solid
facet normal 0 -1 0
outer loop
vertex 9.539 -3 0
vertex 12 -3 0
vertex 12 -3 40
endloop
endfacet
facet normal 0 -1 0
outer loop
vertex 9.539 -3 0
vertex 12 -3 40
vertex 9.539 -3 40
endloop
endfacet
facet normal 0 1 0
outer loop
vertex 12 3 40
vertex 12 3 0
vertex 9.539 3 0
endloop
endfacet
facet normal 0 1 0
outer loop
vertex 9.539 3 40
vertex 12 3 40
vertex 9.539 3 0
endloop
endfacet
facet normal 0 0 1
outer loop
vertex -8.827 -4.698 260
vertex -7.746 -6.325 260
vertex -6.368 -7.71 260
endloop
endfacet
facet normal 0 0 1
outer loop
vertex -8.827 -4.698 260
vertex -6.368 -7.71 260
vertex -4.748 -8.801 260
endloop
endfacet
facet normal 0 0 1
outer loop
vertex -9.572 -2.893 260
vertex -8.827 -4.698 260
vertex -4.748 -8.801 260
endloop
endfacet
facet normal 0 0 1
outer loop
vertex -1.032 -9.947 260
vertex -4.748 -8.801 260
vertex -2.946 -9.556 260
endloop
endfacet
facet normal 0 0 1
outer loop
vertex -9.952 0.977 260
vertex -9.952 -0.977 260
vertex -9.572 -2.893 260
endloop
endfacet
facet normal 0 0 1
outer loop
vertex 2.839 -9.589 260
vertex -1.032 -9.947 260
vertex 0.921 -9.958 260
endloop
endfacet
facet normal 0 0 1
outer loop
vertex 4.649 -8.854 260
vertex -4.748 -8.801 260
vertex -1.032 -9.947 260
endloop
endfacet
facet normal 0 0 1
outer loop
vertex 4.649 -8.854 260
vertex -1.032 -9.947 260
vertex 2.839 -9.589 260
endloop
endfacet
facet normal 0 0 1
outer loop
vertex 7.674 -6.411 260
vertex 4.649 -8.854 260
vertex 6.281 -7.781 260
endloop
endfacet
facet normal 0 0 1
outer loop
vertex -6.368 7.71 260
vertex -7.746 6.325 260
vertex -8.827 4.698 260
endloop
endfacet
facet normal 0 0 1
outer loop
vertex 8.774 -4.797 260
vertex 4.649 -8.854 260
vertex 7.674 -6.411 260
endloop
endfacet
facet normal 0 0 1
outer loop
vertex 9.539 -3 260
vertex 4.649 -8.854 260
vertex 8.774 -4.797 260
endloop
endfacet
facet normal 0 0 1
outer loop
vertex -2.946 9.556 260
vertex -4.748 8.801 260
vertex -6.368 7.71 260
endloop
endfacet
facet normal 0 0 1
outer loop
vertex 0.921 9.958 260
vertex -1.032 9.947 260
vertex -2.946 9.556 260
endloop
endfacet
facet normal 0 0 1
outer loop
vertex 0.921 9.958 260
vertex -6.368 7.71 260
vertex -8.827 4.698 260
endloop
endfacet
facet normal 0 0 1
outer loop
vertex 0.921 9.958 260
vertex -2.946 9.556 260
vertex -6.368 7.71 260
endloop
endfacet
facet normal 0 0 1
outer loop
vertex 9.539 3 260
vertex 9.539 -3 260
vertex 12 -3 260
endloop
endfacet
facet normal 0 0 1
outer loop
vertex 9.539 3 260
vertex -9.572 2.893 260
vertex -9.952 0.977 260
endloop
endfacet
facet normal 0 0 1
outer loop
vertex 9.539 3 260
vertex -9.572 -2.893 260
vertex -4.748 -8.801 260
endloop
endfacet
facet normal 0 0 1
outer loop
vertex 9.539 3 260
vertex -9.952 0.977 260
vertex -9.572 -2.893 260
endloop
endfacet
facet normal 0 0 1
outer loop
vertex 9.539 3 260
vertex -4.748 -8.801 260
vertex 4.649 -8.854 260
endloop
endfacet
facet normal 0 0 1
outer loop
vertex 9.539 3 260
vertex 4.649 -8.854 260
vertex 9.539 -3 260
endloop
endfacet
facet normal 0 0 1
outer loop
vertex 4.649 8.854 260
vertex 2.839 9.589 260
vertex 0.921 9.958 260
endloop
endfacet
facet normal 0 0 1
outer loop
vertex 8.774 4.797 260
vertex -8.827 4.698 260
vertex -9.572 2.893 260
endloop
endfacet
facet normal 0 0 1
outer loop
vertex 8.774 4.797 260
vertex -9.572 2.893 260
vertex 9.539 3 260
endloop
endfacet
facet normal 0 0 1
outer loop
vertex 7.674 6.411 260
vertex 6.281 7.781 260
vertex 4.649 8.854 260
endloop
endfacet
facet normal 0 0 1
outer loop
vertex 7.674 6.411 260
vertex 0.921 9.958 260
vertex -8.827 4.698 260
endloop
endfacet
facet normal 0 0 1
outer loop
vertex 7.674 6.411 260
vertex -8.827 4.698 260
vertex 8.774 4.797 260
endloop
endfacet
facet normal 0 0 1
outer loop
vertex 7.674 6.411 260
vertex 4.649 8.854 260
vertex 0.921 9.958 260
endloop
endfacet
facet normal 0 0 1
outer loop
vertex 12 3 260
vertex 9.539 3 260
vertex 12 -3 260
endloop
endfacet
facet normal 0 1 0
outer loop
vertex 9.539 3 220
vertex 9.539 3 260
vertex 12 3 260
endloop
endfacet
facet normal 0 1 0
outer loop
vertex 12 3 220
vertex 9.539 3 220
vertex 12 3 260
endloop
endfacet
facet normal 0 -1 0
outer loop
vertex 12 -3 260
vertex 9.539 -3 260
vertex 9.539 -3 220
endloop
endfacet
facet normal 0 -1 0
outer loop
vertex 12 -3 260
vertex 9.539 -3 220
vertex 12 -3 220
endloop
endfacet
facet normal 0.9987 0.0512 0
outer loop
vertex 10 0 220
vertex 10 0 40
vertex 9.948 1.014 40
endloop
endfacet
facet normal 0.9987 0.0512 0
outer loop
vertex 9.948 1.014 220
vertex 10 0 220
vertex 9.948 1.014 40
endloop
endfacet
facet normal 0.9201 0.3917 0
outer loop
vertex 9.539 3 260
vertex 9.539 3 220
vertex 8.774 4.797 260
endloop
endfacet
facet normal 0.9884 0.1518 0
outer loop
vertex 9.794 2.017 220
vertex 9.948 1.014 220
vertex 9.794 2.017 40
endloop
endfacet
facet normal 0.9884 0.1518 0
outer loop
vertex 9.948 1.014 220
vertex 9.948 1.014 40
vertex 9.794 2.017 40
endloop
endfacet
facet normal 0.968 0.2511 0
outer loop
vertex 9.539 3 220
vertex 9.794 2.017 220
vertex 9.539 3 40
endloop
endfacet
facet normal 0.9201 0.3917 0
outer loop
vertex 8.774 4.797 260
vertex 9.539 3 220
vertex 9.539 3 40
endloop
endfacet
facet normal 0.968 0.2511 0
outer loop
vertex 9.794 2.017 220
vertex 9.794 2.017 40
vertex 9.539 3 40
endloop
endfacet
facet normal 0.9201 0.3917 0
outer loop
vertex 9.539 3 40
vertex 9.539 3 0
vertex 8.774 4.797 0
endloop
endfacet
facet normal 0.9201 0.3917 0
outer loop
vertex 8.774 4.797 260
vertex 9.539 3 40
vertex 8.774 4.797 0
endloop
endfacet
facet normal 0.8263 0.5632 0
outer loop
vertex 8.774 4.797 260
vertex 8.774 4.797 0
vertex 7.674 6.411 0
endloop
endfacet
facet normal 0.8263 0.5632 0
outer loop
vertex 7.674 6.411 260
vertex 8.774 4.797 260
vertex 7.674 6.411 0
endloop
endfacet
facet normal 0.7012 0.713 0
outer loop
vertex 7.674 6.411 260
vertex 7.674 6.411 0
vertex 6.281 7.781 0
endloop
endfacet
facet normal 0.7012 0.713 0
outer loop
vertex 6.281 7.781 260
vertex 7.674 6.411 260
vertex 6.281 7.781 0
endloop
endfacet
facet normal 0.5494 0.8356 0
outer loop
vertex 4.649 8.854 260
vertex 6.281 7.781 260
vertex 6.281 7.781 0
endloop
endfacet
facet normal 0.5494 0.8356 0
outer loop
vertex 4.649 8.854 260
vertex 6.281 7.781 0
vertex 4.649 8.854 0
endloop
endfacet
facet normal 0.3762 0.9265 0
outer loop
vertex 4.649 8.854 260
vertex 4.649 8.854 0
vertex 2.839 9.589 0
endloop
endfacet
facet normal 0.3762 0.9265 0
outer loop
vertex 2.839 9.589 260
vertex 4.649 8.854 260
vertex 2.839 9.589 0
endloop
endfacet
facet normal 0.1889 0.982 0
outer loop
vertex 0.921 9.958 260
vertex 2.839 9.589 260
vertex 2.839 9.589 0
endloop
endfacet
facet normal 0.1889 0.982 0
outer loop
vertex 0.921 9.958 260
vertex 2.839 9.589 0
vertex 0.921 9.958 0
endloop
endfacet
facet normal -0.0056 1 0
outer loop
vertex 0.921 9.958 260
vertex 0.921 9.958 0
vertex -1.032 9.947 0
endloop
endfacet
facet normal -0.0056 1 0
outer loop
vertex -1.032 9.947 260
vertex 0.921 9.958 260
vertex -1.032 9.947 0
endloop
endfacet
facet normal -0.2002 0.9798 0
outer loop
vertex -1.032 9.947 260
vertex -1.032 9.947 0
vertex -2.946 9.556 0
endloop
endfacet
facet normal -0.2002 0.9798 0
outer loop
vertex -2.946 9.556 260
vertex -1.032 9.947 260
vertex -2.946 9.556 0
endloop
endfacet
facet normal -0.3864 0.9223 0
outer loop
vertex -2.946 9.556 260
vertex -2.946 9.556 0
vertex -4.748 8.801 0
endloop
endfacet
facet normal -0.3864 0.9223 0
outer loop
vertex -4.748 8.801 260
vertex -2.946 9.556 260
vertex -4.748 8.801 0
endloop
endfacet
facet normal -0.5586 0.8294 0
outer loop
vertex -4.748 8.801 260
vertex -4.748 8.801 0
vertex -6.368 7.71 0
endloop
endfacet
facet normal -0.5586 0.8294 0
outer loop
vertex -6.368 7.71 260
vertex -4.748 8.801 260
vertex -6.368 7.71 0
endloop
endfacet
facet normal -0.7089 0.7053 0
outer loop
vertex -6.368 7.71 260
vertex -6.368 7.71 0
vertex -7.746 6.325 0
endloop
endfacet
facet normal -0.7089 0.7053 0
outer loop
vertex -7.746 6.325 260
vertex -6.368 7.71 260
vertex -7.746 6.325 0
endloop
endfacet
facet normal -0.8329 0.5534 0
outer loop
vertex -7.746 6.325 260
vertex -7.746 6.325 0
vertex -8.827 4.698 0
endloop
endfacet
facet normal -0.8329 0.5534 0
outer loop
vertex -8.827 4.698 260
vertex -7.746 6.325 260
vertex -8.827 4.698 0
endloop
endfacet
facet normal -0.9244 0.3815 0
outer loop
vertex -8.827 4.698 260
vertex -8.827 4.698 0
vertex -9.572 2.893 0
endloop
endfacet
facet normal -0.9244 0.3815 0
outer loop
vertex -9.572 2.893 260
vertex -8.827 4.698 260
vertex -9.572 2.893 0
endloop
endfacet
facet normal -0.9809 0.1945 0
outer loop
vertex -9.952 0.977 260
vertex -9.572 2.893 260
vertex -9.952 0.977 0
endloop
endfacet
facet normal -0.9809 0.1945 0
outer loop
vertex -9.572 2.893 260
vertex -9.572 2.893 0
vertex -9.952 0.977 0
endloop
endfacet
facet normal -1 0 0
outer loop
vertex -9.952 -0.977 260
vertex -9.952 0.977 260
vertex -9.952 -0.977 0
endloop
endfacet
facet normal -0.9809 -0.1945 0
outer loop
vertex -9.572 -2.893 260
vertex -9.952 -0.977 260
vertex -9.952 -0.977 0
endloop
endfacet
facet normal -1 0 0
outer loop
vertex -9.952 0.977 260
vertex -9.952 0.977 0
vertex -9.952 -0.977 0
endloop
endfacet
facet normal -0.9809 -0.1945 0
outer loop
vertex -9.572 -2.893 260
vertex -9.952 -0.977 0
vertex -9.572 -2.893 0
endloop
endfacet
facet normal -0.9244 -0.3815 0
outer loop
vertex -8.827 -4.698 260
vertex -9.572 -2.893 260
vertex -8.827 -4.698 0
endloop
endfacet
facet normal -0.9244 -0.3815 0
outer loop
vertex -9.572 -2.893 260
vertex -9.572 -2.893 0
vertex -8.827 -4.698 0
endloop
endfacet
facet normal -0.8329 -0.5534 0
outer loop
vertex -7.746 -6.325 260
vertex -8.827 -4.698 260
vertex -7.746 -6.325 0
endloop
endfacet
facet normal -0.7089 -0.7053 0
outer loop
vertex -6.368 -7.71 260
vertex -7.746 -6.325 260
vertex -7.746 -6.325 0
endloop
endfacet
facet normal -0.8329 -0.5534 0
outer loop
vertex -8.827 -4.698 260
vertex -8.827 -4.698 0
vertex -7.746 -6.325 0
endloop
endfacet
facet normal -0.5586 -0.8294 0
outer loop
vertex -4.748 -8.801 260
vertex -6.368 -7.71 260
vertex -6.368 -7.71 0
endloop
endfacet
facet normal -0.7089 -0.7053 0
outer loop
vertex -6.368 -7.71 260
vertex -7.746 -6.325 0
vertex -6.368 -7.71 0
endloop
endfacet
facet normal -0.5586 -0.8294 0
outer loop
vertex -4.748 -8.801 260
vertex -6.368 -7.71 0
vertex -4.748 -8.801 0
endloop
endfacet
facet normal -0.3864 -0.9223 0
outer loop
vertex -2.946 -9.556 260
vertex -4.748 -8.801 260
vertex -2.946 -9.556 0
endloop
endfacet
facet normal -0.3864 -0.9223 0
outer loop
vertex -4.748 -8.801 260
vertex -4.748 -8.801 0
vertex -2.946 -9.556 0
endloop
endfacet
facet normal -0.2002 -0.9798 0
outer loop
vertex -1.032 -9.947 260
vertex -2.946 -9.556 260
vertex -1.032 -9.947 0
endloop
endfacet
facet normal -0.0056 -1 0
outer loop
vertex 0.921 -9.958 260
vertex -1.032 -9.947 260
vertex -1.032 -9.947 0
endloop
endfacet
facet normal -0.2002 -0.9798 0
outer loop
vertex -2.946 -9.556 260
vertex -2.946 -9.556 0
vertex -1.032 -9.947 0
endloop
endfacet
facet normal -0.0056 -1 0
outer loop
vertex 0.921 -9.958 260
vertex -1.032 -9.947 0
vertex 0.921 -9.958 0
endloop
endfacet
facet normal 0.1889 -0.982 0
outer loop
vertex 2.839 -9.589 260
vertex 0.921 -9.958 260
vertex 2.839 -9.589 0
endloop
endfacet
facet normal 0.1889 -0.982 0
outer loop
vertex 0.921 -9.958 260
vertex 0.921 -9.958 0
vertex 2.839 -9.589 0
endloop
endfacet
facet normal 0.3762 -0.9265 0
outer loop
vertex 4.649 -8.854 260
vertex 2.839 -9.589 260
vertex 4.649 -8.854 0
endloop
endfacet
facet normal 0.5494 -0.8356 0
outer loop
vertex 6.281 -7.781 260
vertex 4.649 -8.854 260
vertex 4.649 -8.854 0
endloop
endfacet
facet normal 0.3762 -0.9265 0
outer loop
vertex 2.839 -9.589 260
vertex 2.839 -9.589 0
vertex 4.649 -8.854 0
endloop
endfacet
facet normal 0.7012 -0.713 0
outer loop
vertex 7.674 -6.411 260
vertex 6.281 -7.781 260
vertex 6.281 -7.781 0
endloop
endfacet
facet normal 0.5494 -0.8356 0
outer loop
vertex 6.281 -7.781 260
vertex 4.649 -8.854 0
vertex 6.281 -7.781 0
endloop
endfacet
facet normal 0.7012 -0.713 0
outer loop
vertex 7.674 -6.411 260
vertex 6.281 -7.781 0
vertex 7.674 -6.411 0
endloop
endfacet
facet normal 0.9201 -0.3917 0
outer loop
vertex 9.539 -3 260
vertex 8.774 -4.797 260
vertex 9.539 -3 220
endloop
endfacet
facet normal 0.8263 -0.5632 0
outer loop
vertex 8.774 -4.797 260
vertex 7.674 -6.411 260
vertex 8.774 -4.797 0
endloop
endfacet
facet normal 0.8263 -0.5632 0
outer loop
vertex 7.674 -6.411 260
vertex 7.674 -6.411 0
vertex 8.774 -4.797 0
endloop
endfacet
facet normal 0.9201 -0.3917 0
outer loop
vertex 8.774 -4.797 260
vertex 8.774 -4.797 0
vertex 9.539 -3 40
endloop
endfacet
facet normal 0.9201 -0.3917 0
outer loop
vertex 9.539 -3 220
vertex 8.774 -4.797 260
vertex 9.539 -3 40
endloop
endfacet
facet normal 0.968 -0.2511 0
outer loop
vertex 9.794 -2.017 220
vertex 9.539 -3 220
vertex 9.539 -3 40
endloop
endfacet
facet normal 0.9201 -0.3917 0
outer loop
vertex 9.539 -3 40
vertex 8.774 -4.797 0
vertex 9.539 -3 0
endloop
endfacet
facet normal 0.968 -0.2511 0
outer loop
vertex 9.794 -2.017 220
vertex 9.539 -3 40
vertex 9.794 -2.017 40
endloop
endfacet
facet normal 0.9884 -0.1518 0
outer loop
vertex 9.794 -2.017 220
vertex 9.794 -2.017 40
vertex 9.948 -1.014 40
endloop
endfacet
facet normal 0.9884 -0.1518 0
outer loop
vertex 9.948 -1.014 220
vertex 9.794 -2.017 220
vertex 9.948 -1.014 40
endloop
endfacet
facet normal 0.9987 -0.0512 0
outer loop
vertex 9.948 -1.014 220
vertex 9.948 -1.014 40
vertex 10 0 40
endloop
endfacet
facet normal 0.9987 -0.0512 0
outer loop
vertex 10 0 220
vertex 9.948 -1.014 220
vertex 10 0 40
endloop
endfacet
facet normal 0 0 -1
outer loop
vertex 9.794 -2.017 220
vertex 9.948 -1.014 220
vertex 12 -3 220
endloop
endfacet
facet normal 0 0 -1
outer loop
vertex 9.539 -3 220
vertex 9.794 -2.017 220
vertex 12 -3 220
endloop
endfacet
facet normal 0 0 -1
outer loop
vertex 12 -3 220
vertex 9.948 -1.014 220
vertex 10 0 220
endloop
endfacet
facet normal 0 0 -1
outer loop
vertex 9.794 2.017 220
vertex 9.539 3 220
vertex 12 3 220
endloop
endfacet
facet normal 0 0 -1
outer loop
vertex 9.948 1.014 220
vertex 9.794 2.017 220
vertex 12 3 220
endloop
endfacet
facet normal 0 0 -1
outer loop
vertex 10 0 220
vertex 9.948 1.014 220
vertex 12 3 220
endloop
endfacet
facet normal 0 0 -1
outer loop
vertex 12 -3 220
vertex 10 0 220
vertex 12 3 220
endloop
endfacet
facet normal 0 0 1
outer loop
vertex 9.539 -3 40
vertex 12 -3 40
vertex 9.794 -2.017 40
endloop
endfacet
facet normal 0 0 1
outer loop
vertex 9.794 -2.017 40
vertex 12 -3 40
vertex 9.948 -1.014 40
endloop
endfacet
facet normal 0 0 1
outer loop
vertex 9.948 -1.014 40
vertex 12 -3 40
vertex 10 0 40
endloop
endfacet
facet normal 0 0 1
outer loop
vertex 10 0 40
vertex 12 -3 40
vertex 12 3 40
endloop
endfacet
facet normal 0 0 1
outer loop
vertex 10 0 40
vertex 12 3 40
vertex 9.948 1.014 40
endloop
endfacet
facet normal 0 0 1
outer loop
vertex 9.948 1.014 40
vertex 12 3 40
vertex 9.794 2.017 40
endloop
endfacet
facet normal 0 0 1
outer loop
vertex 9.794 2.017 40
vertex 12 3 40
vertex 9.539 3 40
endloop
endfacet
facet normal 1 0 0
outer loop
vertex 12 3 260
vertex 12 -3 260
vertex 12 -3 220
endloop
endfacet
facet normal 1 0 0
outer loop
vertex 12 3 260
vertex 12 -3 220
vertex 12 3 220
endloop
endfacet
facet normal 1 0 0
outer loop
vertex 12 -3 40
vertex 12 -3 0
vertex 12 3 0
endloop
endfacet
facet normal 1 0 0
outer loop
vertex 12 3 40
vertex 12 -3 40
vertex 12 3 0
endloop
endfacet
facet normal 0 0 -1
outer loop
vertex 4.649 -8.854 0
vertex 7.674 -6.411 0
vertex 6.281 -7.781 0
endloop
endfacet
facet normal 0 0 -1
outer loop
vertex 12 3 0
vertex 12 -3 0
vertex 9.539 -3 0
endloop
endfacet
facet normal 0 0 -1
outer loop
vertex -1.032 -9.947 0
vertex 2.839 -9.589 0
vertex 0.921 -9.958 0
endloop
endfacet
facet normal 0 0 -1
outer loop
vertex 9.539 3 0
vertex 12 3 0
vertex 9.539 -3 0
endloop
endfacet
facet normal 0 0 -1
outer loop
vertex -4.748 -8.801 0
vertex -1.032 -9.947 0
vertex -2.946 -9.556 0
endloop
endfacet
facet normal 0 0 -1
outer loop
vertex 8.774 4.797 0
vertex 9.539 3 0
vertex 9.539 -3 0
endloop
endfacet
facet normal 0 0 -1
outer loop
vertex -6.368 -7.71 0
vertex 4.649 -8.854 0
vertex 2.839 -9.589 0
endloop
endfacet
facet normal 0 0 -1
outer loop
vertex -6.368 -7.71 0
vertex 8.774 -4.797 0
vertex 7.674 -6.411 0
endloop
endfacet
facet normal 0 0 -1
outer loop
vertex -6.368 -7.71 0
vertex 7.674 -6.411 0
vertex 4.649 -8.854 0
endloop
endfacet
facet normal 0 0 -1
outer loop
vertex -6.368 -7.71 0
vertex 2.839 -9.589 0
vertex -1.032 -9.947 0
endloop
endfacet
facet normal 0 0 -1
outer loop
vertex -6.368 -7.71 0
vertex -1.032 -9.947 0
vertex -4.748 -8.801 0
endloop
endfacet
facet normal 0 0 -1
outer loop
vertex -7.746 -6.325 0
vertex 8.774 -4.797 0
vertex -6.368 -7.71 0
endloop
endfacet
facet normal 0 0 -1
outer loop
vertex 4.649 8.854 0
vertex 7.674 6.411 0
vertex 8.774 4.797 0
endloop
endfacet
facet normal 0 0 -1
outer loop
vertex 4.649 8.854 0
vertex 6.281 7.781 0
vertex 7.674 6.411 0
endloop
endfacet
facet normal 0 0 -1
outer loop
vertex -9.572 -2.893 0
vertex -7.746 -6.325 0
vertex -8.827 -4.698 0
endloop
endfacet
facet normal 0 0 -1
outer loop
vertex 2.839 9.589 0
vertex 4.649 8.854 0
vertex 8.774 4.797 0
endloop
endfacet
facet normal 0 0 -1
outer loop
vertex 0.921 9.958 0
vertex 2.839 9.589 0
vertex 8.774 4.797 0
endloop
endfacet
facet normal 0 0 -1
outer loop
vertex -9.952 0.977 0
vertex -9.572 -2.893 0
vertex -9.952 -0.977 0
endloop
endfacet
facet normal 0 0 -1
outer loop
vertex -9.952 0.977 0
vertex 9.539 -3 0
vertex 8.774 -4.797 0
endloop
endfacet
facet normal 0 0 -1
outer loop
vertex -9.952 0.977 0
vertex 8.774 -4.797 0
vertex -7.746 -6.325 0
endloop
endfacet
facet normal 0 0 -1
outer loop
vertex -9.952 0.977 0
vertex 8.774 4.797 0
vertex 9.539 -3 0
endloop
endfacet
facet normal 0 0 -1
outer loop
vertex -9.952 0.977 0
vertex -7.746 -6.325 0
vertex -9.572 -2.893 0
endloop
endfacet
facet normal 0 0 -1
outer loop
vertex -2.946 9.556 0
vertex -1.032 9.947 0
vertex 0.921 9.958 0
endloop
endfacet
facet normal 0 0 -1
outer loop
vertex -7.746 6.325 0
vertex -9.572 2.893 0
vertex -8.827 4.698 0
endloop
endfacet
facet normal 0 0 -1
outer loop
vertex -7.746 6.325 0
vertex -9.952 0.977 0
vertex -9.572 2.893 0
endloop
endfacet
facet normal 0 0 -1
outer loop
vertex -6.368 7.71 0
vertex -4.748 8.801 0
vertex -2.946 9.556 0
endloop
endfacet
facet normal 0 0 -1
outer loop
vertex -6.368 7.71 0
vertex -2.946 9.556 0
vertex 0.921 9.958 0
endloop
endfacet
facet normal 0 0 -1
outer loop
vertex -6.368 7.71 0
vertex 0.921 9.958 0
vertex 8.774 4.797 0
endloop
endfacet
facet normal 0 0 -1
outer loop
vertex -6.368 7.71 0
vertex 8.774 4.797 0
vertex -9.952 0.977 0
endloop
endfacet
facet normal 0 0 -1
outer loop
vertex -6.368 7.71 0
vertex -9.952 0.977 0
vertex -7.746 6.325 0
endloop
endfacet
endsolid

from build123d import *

# Parameters (mm, degrees)
SKETCH2_R           = 10
BOSS_EXTRUDE5_DEPTH = 260
SKETCH5_W           = 12
SKETCH5_H           = 6
BOSS_EXTRUDE6_DEPTH = 40
SKETCH6_W           = 12
SKETCH6_H           = 6
BOSS_EXTRUDE7_DEPTH = 40


with BuildPart() as part:
    # Sketch2 → Boss-Extrude5 (new body)
    with BuildSketch(Plane.XY):
        Circle(SKETCH2_R)
    extrude(amount=BOSS_EXTRUDE5_DEPTH)

    # Sketch5 → Boss-Extrude6 (add)
    with BuildSketch(Plane.XY.offset(260)):
        with Locations((6, 0)):
            Rectangle(SKETCH5_W, SKETCH5_H)
    extrude(amount=-BOSS_EXTRUDE6_DEPTH)

    # Sketch6 → Boss-Extrude7 (add)
    with BuildSketch(Plane(origin=(0, 0, 0), x_dir=(-1, 0, 0), z_dir=(0, 0, -1))):
        with Locations((-6, 0)):
            Rectangle(SKETCH6_W, SKETCH6_H)
    extrude(amount=-BOSS_EXTRUDE7_DEPTH)


solid = part.part
